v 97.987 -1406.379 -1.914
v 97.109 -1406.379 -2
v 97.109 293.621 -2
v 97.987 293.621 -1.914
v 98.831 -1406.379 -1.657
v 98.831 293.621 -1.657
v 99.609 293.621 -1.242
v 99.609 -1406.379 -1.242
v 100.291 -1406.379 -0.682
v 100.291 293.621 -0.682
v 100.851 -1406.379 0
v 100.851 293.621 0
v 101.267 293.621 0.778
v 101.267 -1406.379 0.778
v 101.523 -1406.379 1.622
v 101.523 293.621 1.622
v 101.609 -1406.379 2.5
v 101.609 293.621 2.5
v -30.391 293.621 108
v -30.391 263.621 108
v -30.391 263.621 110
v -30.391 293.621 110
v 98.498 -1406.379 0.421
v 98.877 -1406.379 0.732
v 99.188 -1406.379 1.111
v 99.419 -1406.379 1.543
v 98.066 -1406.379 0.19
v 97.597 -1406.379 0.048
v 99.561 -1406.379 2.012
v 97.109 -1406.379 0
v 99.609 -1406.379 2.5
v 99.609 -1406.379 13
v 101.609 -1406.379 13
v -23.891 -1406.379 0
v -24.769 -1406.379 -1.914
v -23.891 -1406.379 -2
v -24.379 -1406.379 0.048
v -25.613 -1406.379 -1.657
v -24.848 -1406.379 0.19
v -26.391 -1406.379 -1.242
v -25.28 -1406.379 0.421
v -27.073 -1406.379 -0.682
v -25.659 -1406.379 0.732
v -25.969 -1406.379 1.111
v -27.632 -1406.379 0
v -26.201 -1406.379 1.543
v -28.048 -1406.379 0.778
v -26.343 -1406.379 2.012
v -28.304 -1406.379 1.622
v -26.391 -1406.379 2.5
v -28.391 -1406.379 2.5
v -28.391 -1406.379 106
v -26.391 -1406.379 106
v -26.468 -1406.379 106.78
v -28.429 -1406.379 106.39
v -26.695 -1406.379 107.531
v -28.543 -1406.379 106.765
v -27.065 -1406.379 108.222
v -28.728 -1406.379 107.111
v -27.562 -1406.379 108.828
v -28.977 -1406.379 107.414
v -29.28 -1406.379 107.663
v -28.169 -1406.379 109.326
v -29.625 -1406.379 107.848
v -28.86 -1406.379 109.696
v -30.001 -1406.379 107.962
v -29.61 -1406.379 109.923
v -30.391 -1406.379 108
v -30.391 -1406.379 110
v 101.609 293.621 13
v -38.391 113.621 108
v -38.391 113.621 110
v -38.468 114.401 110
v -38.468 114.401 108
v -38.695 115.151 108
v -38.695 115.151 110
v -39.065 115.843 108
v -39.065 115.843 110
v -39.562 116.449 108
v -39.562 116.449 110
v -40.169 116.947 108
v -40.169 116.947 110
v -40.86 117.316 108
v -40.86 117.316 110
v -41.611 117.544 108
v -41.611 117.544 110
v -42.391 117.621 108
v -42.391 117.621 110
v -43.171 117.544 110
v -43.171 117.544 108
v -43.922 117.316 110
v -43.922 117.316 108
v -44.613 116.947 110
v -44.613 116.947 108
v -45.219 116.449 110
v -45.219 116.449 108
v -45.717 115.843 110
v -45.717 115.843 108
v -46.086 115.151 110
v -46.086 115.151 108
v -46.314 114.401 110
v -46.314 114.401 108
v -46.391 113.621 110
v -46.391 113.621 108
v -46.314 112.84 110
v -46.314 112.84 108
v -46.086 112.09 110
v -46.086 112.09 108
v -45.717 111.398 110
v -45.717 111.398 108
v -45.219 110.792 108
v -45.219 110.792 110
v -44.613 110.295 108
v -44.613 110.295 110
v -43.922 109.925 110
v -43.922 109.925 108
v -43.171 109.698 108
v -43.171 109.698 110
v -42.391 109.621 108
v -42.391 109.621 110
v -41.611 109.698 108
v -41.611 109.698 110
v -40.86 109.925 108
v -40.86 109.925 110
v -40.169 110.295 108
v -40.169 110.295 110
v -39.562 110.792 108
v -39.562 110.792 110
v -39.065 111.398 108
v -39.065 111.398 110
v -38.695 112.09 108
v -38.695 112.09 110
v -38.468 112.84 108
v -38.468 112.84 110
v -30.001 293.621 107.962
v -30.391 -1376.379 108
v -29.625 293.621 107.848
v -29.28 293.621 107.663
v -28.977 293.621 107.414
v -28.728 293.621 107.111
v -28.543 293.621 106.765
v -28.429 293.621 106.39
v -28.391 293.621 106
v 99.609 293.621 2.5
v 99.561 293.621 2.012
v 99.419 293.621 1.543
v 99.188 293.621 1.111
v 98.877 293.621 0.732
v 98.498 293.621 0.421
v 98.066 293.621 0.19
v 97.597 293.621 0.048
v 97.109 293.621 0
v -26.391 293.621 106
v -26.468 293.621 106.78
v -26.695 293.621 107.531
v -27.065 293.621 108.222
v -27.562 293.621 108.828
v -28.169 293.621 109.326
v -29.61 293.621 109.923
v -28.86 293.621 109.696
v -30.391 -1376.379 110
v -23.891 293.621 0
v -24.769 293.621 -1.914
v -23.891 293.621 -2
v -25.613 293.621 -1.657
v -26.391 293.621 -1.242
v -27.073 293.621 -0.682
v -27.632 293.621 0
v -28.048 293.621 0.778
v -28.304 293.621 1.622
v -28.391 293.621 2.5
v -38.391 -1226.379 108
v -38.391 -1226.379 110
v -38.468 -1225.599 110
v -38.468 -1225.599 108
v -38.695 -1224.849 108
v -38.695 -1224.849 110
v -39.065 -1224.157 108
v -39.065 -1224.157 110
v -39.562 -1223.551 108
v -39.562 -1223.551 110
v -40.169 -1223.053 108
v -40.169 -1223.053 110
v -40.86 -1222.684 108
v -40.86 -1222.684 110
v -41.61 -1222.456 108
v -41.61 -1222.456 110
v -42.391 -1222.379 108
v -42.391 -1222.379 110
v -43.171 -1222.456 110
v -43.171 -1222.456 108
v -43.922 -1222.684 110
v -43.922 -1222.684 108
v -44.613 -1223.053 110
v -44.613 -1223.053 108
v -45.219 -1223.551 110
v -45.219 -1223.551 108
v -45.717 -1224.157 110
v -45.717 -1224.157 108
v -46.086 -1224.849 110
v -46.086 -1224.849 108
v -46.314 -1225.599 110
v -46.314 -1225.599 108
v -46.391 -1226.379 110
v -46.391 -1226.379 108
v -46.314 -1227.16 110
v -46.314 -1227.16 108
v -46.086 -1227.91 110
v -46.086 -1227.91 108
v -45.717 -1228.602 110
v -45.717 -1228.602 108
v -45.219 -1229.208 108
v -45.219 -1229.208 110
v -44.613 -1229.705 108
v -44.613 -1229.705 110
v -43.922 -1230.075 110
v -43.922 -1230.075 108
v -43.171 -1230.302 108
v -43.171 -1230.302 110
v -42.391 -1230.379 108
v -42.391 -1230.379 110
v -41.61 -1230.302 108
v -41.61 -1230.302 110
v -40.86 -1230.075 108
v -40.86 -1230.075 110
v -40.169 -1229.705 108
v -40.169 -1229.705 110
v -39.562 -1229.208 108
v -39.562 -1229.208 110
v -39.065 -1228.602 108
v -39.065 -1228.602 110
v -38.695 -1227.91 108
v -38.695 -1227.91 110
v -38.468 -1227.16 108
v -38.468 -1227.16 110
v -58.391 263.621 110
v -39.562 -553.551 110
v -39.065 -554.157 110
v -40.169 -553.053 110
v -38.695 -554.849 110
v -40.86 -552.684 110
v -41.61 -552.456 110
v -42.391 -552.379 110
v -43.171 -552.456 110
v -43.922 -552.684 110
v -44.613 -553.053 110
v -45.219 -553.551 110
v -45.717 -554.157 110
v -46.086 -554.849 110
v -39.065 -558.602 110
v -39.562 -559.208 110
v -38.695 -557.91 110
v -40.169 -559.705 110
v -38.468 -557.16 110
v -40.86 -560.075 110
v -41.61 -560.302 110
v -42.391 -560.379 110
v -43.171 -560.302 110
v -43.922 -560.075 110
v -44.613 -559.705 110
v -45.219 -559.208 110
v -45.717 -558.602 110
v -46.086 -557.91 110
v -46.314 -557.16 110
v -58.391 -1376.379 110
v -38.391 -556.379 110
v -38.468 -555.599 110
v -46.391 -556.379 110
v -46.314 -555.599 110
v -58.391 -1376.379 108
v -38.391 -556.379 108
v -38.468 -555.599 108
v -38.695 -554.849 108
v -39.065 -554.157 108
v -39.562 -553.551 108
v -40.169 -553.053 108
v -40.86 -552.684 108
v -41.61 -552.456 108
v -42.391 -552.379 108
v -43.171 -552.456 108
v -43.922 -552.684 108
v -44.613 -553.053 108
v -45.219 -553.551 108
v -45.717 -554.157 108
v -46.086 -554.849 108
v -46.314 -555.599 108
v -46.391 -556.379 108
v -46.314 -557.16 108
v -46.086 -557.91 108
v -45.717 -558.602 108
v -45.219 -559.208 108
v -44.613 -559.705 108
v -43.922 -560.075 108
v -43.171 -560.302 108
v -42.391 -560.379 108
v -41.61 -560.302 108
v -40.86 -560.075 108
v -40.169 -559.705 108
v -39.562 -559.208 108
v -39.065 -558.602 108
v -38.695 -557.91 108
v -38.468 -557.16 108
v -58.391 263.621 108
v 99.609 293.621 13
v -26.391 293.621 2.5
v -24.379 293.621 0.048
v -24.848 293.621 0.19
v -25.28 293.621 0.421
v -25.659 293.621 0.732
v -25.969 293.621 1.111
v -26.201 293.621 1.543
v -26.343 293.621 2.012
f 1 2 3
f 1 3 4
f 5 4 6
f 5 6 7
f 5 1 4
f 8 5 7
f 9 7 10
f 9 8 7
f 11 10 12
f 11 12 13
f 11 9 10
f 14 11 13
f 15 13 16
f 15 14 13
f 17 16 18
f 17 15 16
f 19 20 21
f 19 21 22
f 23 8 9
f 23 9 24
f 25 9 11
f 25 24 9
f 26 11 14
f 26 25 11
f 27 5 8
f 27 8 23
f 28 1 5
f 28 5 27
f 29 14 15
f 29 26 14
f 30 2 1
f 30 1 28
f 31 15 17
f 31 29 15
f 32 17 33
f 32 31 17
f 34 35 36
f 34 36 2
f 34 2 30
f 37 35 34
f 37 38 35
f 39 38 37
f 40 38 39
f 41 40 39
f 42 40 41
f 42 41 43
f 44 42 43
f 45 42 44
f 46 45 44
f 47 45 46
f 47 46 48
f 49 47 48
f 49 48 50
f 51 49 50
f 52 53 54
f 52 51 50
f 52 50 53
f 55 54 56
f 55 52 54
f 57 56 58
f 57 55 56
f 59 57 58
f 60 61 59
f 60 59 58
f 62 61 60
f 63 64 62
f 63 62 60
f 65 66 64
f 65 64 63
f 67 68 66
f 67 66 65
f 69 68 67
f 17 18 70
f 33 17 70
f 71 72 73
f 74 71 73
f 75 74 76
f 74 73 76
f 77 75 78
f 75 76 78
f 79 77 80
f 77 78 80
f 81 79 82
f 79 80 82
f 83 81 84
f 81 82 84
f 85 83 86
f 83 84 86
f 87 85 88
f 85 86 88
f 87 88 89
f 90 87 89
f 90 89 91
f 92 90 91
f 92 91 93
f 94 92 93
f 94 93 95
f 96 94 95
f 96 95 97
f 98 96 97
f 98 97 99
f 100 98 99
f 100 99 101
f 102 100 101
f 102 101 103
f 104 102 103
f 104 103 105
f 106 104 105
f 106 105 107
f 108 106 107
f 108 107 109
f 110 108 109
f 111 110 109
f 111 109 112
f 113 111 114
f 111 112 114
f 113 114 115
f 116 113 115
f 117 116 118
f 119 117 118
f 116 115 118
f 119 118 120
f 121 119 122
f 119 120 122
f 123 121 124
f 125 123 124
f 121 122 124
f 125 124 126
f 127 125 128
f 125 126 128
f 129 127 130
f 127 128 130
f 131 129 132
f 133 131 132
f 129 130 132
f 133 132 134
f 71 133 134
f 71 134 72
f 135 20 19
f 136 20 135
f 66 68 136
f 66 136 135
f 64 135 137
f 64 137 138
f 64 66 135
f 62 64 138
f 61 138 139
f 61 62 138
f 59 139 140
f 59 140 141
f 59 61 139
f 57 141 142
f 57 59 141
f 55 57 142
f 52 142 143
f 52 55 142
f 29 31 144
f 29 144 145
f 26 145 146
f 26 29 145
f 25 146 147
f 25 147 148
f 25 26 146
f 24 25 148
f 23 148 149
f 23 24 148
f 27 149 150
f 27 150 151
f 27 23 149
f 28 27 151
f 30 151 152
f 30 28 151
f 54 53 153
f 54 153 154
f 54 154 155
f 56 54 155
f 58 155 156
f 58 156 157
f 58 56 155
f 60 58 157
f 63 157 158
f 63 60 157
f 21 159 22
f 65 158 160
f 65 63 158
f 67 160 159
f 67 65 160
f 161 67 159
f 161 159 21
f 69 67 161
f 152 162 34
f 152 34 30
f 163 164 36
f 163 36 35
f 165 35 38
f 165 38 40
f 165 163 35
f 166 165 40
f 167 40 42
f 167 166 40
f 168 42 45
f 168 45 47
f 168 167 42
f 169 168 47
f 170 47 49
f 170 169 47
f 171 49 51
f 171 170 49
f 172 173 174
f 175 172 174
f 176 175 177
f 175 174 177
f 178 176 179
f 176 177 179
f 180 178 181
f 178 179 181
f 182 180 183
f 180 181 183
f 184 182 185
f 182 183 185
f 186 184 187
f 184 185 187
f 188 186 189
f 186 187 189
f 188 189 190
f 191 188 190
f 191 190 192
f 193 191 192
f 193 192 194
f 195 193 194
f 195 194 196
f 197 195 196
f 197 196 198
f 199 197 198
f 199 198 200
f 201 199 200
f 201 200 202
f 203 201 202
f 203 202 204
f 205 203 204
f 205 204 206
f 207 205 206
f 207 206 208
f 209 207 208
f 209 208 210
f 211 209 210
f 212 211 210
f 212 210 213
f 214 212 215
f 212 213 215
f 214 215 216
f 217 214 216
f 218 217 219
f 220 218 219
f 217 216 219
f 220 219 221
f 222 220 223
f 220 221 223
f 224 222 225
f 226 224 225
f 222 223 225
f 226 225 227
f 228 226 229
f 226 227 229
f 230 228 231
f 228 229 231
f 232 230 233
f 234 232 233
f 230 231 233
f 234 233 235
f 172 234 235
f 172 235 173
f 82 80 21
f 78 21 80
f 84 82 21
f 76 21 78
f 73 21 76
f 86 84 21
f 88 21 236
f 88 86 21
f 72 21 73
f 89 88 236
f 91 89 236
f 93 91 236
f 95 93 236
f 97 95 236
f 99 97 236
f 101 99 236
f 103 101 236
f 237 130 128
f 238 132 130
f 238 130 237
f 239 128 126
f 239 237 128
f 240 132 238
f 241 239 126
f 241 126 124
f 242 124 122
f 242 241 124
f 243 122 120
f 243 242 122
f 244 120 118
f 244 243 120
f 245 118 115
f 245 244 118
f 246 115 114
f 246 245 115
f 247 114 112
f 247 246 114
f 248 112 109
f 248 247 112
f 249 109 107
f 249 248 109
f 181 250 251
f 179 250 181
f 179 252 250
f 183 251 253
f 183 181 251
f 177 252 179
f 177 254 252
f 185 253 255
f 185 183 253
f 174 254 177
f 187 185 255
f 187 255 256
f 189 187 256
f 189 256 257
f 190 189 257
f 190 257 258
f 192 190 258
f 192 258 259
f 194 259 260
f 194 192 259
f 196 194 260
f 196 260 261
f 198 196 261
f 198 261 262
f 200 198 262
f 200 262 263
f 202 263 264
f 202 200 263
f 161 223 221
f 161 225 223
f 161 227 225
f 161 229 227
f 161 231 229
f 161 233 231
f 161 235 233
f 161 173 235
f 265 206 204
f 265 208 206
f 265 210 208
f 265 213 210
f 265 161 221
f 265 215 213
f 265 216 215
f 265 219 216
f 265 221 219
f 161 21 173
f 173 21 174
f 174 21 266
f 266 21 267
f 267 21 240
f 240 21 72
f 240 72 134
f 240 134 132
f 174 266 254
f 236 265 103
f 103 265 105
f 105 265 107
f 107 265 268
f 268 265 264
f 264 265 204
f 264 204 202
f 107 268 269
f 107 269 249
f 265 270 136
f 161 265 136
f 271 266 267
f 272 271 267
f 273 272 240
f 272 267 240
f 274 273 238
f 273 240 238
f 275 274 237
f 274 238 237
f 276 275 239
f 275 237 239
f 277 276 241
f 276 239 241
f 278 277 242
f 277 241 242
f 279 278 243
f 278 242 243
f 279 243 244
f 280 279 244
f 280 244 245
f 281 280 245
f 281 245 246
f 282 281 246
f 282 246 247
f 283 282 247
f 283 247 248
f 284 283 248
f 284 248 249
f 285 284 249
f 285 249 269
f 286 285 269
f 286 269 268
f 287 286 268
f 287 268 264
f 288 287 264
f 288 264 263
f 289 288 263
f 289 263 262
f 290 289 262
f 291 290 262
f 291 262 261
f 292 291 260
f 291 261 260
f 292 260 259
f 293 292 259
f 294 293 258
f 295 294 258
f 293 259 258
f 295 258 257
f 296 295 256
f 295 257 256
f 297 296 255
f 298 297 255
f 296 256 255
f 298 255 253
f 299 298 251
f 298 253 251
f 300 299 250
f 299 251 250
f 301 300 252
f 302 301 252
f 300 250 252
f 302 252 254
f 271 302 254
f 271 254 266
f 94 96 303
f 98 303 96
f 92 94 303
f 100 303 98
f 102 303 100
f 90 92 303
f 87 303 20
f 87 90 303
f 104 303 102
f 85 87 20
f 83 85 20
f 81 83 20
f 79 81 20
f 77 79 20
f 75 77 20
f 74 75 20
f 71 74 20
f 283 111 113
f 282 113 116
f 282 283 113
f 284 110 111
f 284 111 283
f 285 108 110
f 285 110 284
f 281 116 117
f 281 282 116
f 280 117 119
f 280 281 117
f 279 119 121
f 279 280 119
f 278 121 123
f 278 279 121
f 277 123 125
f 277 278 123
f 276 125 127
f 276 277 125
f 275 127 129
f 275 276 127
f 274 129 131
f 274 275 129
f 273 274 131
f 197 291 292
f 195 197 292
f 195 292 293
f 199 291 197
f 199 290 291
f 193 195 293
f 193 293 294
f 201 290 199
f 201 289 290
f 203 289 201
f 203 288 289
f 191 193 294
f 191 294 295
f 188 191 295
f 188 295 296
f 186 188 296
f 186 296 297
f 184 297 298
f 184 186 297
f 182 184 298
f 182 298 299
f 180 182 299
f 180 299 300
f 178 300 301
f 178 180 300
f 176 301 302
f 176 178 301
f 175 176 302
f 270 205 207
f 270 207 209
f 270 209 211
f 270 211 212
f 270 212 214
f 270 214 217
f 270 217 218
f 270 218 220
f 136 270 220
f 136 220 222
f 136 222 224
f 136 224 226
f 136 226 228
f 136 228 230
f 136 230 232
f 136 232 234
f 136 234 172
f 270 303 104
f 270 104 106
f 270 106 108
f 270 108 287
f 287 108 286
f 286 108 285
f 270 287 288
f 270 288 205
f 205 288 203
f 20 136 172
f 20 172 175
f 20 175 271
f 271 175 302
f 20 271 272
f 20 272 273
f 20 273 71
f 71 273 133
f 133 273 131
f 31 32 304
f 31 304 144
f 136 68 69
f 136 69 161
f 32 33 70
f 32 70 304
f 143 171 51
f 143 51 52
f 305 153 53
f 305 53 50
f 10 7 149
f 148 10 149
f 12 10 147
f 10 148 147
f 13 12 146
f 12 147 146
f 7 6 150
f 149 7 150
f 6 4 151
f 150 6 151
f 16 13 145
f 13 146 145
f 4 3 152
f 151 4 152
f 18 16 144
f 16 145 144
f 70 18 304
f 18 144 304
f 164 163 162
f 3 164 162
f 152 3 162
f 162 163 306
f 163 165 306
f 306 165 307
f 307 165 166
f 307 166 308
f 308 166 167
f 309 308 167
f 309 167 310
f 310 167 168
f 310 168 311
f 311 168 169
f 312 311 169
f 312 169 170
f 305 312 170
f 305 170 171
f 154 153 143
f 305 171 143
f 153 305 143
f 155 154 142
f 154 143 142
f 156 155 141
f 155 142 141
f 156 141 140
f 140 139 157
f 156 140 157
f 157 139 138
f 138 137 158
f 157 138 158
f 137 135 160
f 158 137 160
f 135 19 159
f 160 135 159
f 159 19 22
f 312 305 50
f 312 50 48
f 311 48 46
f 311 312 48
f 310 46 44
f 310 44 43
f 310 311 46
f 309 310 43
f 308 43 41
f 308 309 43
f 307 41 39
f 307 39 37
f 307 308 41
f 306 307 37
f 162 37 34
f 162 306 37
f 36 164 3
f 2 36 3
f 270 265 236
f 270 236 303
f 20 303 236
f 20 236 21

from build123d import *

# Parameters (mm, degrees)
SKETCH1_W                    = 130
SKETCH1_H                    = 1700
BASE_FLANGE1_DEPTH           = 2
EDGE_FLANGE1_STRIP_W         = 13
EDGE_FLANGE1_STRIP_H         = 2
EDGE_FLANGE1_STRIP_CUT_DEPTH = 1700
EDGE_FLANGE1_DEPTH           = 1700
EDGE_FLANGE2_STRIP_W         = 13
EDGE_FLANGE2_STRIP_H         = 2
EDGE_FLANGE2_STRIP_CUT_DEPTH = 1700
EDGE_FLANGE2_DEPTH           = 1700
EDGE_FLANGE3_STRIP_W         = 12
EDGE_FLANGE3_STRIP_H         = 2
EDGE_FLANGE3_STRIP_CUT_DEPTH = 1700
EDGE_FLANGE3_DEPTH           = 1700
CUT_EXTRUDE1_DEPTH           = 1415.486194049
CUT_EXTRUDE1_DEPTH_BACK      = 1415.486194049
SKETCH15_W                   = 28
SKETCH15_H                   = 30
SKETCH16_R                   = 4
CUT_EXTRUDE2_DEPTH           = 10


# Sheet-metal steps are written as plain solids
with BuildPart() as part:
    # Sketch1 → Base-Flange1 (new body)
    with BuildSketch(Plane.XY):
        with Locations((36.609195402, -556.379310345)):
            Rectangle(SKETCH1_W, SKETCH1_H)
    extrude(amount=-BASE_FLANGE1_DEPTH)

    # Edge-Flange1 strip (across the edge) → Edge-Flange1 strip cut (cut)
    with BuildSketch(Plane(origin=(101.609195402, -1406.379310345, 0), x_dir=(-1, 0, 0), z_dir=(0, 1, 0))):
        with Locations((-2, -1)):
            Rectangle(EDGE_FLANGE1_STRIP_W, EDGE_FLANGE1_STRIP_H)
    extrude(amount=EDGE_FLANGE1_STRIP_CUT_DEPTH, mode=Mode.SUBTRACT)

    # Edge-Flange1 section (across the edge) → Edge-Flange1 (add)
    with BuildSketch(Plane(origin=(101.609195402, -1406.379310345, 0), x_dir=(-1, 0, 0), z_dir=(0, 1, 0))):
        with BuildLine():
            Line((0, 2.5), (0, 13))
            Line((0, 13), (2, 13))
            Line((2, 13), (2, 2.5))
            ThreePointArc((2, 2.5), (2.732233047, 0.732233047), (4.5, 0))
            Line((4.5, 0), (4.5, -2))
            ThreePointArc((4.5, -2), (1.318019485, -0.681980515), (0, 2.5))
        make_face()
    extrude(amount=EDGE_FLANGE1_DEPTH)

    # Edge-Flange2 strip (across the edge) → Edge-Flange2 strip cut (cut)
    with BuildSketch(Plane(origin=(-28.390804598, 293.620689655, 0), x_dir=(1, 0, 0), z_dir=(0, -1, 0))):
        with Locations((-2, -1)):
            Rectangle(EDGE_FLANGE2_STRIP_W, EDGE_FLANGE2_STRIP_H)
    extrude(amount=EDGE_FLANGE2_STRIP_CUT_DEPTH, mode=Mode.SUBTRACT)

    # Edge-Flange2 section (across the edge) → Edge-Flange2 (add)
    with BuildSketch(Plane(origin=(-28.390804598, 293.620689655, 0), x_dir=(1, 0, 0), z_dir=(0, -1, 0))):
        with BuildLine():
            Line((0, 2.5), (0, 108))
            Line((0, 108), (2, 108))
            Line((2, 108), (2, 2.5))
            ThreePointArc((2, 2.5), (2.732233047, 0.732233047), (4.5, 0))
            Line((4.5, 0), (4.5, -2))
            ThreePointArc((4.5, -2), (1.318019485, -0.681980515), (0, 2.5))
        make_face()
    extrude(amount=EDGE_FLANGE2_DEPTH)

    # Edge-Flange3 strip (across the edge) → Edge-Flange3 strip cut (cut)
    with BuildSketch(Plane(origin=(-28.390804598, -1406.379310345, 108), x_dir=(0, 0, -1), z_dir=(0, 1, 0))):
        with Locations((-4, -1)):
            Rectangle(EDGE_FLANGE3_STRIP_W, EDGE_FLANGE3_STRIP_H)
    extrude(amount=EDGE_FLANGE3_STRIP_CUT_DEPTH, mode=Mode.SUBTRACT)

    # Edge-Flange3 section (across the edge) → Edge-Flange3 (add)
    with BuildSketch(Plane(origin=(-28.390804598, -1406.379310345, 108), x_dir=(0, 0, -1), z_dir=(0, 1, 0))):
        with BuildLine():
            Line((-2, 2), (-2, 30))
            Line((-2, 30), (0, 30))
            Line((0, 30), (0, 2))
            ThreePointArc((0, 2), (0.585786438, 0.585786438), (2, 0))
            Line((2, 0), (2, -2))
            ThreePointArc((2, -2), (-0.828427125, -0.828427125), (-2, 2))
        make_face()
    extrude(amount=EDGE_FLANGE3_DEPTH)

    # Sketch15 → Cut-Extrude1 (cut, two sides: drawn at the far end of the back side and taken through both)
    with BuildSketch(Plane.XY.offset(110).offset(-CUT_EXTRUDE1_DEPTH_BACK)):
        with Locations((-44.390804598, -1391.379310345)):
            Rectangle(SKETCH15_W, SKETCH15_H)
        with Locations((-44.390804598, 278.620689655)):
            Rectangle(SKETCH15_W, SKETCH15_H)
    extrude(amount=CUT_EXTRUDE1_DEPTH + CUT_EXTRUDE1_DEPTH_BACK, mode=Mode.SUBTRACT)

    # Sketch16 → Cut-Extrude2 (cut)
    with BuildSketch(Plane.XY.offset(110)):
        with Locations((-42.390804598, -1226.379310345)):
            Circle(SKETCH16_R)
        with Locations((-42.390841166, -556.379310345)):
            Circle(SKETCH16_R)
        with Locations((-42.390877735, 113.620689655)):
            Circle(SKETCH16_R)
    extrude(amount=-CUT_EXTRUDE2_DEPTH, mode=Mode.SUBTRACT)


solid = part.part
